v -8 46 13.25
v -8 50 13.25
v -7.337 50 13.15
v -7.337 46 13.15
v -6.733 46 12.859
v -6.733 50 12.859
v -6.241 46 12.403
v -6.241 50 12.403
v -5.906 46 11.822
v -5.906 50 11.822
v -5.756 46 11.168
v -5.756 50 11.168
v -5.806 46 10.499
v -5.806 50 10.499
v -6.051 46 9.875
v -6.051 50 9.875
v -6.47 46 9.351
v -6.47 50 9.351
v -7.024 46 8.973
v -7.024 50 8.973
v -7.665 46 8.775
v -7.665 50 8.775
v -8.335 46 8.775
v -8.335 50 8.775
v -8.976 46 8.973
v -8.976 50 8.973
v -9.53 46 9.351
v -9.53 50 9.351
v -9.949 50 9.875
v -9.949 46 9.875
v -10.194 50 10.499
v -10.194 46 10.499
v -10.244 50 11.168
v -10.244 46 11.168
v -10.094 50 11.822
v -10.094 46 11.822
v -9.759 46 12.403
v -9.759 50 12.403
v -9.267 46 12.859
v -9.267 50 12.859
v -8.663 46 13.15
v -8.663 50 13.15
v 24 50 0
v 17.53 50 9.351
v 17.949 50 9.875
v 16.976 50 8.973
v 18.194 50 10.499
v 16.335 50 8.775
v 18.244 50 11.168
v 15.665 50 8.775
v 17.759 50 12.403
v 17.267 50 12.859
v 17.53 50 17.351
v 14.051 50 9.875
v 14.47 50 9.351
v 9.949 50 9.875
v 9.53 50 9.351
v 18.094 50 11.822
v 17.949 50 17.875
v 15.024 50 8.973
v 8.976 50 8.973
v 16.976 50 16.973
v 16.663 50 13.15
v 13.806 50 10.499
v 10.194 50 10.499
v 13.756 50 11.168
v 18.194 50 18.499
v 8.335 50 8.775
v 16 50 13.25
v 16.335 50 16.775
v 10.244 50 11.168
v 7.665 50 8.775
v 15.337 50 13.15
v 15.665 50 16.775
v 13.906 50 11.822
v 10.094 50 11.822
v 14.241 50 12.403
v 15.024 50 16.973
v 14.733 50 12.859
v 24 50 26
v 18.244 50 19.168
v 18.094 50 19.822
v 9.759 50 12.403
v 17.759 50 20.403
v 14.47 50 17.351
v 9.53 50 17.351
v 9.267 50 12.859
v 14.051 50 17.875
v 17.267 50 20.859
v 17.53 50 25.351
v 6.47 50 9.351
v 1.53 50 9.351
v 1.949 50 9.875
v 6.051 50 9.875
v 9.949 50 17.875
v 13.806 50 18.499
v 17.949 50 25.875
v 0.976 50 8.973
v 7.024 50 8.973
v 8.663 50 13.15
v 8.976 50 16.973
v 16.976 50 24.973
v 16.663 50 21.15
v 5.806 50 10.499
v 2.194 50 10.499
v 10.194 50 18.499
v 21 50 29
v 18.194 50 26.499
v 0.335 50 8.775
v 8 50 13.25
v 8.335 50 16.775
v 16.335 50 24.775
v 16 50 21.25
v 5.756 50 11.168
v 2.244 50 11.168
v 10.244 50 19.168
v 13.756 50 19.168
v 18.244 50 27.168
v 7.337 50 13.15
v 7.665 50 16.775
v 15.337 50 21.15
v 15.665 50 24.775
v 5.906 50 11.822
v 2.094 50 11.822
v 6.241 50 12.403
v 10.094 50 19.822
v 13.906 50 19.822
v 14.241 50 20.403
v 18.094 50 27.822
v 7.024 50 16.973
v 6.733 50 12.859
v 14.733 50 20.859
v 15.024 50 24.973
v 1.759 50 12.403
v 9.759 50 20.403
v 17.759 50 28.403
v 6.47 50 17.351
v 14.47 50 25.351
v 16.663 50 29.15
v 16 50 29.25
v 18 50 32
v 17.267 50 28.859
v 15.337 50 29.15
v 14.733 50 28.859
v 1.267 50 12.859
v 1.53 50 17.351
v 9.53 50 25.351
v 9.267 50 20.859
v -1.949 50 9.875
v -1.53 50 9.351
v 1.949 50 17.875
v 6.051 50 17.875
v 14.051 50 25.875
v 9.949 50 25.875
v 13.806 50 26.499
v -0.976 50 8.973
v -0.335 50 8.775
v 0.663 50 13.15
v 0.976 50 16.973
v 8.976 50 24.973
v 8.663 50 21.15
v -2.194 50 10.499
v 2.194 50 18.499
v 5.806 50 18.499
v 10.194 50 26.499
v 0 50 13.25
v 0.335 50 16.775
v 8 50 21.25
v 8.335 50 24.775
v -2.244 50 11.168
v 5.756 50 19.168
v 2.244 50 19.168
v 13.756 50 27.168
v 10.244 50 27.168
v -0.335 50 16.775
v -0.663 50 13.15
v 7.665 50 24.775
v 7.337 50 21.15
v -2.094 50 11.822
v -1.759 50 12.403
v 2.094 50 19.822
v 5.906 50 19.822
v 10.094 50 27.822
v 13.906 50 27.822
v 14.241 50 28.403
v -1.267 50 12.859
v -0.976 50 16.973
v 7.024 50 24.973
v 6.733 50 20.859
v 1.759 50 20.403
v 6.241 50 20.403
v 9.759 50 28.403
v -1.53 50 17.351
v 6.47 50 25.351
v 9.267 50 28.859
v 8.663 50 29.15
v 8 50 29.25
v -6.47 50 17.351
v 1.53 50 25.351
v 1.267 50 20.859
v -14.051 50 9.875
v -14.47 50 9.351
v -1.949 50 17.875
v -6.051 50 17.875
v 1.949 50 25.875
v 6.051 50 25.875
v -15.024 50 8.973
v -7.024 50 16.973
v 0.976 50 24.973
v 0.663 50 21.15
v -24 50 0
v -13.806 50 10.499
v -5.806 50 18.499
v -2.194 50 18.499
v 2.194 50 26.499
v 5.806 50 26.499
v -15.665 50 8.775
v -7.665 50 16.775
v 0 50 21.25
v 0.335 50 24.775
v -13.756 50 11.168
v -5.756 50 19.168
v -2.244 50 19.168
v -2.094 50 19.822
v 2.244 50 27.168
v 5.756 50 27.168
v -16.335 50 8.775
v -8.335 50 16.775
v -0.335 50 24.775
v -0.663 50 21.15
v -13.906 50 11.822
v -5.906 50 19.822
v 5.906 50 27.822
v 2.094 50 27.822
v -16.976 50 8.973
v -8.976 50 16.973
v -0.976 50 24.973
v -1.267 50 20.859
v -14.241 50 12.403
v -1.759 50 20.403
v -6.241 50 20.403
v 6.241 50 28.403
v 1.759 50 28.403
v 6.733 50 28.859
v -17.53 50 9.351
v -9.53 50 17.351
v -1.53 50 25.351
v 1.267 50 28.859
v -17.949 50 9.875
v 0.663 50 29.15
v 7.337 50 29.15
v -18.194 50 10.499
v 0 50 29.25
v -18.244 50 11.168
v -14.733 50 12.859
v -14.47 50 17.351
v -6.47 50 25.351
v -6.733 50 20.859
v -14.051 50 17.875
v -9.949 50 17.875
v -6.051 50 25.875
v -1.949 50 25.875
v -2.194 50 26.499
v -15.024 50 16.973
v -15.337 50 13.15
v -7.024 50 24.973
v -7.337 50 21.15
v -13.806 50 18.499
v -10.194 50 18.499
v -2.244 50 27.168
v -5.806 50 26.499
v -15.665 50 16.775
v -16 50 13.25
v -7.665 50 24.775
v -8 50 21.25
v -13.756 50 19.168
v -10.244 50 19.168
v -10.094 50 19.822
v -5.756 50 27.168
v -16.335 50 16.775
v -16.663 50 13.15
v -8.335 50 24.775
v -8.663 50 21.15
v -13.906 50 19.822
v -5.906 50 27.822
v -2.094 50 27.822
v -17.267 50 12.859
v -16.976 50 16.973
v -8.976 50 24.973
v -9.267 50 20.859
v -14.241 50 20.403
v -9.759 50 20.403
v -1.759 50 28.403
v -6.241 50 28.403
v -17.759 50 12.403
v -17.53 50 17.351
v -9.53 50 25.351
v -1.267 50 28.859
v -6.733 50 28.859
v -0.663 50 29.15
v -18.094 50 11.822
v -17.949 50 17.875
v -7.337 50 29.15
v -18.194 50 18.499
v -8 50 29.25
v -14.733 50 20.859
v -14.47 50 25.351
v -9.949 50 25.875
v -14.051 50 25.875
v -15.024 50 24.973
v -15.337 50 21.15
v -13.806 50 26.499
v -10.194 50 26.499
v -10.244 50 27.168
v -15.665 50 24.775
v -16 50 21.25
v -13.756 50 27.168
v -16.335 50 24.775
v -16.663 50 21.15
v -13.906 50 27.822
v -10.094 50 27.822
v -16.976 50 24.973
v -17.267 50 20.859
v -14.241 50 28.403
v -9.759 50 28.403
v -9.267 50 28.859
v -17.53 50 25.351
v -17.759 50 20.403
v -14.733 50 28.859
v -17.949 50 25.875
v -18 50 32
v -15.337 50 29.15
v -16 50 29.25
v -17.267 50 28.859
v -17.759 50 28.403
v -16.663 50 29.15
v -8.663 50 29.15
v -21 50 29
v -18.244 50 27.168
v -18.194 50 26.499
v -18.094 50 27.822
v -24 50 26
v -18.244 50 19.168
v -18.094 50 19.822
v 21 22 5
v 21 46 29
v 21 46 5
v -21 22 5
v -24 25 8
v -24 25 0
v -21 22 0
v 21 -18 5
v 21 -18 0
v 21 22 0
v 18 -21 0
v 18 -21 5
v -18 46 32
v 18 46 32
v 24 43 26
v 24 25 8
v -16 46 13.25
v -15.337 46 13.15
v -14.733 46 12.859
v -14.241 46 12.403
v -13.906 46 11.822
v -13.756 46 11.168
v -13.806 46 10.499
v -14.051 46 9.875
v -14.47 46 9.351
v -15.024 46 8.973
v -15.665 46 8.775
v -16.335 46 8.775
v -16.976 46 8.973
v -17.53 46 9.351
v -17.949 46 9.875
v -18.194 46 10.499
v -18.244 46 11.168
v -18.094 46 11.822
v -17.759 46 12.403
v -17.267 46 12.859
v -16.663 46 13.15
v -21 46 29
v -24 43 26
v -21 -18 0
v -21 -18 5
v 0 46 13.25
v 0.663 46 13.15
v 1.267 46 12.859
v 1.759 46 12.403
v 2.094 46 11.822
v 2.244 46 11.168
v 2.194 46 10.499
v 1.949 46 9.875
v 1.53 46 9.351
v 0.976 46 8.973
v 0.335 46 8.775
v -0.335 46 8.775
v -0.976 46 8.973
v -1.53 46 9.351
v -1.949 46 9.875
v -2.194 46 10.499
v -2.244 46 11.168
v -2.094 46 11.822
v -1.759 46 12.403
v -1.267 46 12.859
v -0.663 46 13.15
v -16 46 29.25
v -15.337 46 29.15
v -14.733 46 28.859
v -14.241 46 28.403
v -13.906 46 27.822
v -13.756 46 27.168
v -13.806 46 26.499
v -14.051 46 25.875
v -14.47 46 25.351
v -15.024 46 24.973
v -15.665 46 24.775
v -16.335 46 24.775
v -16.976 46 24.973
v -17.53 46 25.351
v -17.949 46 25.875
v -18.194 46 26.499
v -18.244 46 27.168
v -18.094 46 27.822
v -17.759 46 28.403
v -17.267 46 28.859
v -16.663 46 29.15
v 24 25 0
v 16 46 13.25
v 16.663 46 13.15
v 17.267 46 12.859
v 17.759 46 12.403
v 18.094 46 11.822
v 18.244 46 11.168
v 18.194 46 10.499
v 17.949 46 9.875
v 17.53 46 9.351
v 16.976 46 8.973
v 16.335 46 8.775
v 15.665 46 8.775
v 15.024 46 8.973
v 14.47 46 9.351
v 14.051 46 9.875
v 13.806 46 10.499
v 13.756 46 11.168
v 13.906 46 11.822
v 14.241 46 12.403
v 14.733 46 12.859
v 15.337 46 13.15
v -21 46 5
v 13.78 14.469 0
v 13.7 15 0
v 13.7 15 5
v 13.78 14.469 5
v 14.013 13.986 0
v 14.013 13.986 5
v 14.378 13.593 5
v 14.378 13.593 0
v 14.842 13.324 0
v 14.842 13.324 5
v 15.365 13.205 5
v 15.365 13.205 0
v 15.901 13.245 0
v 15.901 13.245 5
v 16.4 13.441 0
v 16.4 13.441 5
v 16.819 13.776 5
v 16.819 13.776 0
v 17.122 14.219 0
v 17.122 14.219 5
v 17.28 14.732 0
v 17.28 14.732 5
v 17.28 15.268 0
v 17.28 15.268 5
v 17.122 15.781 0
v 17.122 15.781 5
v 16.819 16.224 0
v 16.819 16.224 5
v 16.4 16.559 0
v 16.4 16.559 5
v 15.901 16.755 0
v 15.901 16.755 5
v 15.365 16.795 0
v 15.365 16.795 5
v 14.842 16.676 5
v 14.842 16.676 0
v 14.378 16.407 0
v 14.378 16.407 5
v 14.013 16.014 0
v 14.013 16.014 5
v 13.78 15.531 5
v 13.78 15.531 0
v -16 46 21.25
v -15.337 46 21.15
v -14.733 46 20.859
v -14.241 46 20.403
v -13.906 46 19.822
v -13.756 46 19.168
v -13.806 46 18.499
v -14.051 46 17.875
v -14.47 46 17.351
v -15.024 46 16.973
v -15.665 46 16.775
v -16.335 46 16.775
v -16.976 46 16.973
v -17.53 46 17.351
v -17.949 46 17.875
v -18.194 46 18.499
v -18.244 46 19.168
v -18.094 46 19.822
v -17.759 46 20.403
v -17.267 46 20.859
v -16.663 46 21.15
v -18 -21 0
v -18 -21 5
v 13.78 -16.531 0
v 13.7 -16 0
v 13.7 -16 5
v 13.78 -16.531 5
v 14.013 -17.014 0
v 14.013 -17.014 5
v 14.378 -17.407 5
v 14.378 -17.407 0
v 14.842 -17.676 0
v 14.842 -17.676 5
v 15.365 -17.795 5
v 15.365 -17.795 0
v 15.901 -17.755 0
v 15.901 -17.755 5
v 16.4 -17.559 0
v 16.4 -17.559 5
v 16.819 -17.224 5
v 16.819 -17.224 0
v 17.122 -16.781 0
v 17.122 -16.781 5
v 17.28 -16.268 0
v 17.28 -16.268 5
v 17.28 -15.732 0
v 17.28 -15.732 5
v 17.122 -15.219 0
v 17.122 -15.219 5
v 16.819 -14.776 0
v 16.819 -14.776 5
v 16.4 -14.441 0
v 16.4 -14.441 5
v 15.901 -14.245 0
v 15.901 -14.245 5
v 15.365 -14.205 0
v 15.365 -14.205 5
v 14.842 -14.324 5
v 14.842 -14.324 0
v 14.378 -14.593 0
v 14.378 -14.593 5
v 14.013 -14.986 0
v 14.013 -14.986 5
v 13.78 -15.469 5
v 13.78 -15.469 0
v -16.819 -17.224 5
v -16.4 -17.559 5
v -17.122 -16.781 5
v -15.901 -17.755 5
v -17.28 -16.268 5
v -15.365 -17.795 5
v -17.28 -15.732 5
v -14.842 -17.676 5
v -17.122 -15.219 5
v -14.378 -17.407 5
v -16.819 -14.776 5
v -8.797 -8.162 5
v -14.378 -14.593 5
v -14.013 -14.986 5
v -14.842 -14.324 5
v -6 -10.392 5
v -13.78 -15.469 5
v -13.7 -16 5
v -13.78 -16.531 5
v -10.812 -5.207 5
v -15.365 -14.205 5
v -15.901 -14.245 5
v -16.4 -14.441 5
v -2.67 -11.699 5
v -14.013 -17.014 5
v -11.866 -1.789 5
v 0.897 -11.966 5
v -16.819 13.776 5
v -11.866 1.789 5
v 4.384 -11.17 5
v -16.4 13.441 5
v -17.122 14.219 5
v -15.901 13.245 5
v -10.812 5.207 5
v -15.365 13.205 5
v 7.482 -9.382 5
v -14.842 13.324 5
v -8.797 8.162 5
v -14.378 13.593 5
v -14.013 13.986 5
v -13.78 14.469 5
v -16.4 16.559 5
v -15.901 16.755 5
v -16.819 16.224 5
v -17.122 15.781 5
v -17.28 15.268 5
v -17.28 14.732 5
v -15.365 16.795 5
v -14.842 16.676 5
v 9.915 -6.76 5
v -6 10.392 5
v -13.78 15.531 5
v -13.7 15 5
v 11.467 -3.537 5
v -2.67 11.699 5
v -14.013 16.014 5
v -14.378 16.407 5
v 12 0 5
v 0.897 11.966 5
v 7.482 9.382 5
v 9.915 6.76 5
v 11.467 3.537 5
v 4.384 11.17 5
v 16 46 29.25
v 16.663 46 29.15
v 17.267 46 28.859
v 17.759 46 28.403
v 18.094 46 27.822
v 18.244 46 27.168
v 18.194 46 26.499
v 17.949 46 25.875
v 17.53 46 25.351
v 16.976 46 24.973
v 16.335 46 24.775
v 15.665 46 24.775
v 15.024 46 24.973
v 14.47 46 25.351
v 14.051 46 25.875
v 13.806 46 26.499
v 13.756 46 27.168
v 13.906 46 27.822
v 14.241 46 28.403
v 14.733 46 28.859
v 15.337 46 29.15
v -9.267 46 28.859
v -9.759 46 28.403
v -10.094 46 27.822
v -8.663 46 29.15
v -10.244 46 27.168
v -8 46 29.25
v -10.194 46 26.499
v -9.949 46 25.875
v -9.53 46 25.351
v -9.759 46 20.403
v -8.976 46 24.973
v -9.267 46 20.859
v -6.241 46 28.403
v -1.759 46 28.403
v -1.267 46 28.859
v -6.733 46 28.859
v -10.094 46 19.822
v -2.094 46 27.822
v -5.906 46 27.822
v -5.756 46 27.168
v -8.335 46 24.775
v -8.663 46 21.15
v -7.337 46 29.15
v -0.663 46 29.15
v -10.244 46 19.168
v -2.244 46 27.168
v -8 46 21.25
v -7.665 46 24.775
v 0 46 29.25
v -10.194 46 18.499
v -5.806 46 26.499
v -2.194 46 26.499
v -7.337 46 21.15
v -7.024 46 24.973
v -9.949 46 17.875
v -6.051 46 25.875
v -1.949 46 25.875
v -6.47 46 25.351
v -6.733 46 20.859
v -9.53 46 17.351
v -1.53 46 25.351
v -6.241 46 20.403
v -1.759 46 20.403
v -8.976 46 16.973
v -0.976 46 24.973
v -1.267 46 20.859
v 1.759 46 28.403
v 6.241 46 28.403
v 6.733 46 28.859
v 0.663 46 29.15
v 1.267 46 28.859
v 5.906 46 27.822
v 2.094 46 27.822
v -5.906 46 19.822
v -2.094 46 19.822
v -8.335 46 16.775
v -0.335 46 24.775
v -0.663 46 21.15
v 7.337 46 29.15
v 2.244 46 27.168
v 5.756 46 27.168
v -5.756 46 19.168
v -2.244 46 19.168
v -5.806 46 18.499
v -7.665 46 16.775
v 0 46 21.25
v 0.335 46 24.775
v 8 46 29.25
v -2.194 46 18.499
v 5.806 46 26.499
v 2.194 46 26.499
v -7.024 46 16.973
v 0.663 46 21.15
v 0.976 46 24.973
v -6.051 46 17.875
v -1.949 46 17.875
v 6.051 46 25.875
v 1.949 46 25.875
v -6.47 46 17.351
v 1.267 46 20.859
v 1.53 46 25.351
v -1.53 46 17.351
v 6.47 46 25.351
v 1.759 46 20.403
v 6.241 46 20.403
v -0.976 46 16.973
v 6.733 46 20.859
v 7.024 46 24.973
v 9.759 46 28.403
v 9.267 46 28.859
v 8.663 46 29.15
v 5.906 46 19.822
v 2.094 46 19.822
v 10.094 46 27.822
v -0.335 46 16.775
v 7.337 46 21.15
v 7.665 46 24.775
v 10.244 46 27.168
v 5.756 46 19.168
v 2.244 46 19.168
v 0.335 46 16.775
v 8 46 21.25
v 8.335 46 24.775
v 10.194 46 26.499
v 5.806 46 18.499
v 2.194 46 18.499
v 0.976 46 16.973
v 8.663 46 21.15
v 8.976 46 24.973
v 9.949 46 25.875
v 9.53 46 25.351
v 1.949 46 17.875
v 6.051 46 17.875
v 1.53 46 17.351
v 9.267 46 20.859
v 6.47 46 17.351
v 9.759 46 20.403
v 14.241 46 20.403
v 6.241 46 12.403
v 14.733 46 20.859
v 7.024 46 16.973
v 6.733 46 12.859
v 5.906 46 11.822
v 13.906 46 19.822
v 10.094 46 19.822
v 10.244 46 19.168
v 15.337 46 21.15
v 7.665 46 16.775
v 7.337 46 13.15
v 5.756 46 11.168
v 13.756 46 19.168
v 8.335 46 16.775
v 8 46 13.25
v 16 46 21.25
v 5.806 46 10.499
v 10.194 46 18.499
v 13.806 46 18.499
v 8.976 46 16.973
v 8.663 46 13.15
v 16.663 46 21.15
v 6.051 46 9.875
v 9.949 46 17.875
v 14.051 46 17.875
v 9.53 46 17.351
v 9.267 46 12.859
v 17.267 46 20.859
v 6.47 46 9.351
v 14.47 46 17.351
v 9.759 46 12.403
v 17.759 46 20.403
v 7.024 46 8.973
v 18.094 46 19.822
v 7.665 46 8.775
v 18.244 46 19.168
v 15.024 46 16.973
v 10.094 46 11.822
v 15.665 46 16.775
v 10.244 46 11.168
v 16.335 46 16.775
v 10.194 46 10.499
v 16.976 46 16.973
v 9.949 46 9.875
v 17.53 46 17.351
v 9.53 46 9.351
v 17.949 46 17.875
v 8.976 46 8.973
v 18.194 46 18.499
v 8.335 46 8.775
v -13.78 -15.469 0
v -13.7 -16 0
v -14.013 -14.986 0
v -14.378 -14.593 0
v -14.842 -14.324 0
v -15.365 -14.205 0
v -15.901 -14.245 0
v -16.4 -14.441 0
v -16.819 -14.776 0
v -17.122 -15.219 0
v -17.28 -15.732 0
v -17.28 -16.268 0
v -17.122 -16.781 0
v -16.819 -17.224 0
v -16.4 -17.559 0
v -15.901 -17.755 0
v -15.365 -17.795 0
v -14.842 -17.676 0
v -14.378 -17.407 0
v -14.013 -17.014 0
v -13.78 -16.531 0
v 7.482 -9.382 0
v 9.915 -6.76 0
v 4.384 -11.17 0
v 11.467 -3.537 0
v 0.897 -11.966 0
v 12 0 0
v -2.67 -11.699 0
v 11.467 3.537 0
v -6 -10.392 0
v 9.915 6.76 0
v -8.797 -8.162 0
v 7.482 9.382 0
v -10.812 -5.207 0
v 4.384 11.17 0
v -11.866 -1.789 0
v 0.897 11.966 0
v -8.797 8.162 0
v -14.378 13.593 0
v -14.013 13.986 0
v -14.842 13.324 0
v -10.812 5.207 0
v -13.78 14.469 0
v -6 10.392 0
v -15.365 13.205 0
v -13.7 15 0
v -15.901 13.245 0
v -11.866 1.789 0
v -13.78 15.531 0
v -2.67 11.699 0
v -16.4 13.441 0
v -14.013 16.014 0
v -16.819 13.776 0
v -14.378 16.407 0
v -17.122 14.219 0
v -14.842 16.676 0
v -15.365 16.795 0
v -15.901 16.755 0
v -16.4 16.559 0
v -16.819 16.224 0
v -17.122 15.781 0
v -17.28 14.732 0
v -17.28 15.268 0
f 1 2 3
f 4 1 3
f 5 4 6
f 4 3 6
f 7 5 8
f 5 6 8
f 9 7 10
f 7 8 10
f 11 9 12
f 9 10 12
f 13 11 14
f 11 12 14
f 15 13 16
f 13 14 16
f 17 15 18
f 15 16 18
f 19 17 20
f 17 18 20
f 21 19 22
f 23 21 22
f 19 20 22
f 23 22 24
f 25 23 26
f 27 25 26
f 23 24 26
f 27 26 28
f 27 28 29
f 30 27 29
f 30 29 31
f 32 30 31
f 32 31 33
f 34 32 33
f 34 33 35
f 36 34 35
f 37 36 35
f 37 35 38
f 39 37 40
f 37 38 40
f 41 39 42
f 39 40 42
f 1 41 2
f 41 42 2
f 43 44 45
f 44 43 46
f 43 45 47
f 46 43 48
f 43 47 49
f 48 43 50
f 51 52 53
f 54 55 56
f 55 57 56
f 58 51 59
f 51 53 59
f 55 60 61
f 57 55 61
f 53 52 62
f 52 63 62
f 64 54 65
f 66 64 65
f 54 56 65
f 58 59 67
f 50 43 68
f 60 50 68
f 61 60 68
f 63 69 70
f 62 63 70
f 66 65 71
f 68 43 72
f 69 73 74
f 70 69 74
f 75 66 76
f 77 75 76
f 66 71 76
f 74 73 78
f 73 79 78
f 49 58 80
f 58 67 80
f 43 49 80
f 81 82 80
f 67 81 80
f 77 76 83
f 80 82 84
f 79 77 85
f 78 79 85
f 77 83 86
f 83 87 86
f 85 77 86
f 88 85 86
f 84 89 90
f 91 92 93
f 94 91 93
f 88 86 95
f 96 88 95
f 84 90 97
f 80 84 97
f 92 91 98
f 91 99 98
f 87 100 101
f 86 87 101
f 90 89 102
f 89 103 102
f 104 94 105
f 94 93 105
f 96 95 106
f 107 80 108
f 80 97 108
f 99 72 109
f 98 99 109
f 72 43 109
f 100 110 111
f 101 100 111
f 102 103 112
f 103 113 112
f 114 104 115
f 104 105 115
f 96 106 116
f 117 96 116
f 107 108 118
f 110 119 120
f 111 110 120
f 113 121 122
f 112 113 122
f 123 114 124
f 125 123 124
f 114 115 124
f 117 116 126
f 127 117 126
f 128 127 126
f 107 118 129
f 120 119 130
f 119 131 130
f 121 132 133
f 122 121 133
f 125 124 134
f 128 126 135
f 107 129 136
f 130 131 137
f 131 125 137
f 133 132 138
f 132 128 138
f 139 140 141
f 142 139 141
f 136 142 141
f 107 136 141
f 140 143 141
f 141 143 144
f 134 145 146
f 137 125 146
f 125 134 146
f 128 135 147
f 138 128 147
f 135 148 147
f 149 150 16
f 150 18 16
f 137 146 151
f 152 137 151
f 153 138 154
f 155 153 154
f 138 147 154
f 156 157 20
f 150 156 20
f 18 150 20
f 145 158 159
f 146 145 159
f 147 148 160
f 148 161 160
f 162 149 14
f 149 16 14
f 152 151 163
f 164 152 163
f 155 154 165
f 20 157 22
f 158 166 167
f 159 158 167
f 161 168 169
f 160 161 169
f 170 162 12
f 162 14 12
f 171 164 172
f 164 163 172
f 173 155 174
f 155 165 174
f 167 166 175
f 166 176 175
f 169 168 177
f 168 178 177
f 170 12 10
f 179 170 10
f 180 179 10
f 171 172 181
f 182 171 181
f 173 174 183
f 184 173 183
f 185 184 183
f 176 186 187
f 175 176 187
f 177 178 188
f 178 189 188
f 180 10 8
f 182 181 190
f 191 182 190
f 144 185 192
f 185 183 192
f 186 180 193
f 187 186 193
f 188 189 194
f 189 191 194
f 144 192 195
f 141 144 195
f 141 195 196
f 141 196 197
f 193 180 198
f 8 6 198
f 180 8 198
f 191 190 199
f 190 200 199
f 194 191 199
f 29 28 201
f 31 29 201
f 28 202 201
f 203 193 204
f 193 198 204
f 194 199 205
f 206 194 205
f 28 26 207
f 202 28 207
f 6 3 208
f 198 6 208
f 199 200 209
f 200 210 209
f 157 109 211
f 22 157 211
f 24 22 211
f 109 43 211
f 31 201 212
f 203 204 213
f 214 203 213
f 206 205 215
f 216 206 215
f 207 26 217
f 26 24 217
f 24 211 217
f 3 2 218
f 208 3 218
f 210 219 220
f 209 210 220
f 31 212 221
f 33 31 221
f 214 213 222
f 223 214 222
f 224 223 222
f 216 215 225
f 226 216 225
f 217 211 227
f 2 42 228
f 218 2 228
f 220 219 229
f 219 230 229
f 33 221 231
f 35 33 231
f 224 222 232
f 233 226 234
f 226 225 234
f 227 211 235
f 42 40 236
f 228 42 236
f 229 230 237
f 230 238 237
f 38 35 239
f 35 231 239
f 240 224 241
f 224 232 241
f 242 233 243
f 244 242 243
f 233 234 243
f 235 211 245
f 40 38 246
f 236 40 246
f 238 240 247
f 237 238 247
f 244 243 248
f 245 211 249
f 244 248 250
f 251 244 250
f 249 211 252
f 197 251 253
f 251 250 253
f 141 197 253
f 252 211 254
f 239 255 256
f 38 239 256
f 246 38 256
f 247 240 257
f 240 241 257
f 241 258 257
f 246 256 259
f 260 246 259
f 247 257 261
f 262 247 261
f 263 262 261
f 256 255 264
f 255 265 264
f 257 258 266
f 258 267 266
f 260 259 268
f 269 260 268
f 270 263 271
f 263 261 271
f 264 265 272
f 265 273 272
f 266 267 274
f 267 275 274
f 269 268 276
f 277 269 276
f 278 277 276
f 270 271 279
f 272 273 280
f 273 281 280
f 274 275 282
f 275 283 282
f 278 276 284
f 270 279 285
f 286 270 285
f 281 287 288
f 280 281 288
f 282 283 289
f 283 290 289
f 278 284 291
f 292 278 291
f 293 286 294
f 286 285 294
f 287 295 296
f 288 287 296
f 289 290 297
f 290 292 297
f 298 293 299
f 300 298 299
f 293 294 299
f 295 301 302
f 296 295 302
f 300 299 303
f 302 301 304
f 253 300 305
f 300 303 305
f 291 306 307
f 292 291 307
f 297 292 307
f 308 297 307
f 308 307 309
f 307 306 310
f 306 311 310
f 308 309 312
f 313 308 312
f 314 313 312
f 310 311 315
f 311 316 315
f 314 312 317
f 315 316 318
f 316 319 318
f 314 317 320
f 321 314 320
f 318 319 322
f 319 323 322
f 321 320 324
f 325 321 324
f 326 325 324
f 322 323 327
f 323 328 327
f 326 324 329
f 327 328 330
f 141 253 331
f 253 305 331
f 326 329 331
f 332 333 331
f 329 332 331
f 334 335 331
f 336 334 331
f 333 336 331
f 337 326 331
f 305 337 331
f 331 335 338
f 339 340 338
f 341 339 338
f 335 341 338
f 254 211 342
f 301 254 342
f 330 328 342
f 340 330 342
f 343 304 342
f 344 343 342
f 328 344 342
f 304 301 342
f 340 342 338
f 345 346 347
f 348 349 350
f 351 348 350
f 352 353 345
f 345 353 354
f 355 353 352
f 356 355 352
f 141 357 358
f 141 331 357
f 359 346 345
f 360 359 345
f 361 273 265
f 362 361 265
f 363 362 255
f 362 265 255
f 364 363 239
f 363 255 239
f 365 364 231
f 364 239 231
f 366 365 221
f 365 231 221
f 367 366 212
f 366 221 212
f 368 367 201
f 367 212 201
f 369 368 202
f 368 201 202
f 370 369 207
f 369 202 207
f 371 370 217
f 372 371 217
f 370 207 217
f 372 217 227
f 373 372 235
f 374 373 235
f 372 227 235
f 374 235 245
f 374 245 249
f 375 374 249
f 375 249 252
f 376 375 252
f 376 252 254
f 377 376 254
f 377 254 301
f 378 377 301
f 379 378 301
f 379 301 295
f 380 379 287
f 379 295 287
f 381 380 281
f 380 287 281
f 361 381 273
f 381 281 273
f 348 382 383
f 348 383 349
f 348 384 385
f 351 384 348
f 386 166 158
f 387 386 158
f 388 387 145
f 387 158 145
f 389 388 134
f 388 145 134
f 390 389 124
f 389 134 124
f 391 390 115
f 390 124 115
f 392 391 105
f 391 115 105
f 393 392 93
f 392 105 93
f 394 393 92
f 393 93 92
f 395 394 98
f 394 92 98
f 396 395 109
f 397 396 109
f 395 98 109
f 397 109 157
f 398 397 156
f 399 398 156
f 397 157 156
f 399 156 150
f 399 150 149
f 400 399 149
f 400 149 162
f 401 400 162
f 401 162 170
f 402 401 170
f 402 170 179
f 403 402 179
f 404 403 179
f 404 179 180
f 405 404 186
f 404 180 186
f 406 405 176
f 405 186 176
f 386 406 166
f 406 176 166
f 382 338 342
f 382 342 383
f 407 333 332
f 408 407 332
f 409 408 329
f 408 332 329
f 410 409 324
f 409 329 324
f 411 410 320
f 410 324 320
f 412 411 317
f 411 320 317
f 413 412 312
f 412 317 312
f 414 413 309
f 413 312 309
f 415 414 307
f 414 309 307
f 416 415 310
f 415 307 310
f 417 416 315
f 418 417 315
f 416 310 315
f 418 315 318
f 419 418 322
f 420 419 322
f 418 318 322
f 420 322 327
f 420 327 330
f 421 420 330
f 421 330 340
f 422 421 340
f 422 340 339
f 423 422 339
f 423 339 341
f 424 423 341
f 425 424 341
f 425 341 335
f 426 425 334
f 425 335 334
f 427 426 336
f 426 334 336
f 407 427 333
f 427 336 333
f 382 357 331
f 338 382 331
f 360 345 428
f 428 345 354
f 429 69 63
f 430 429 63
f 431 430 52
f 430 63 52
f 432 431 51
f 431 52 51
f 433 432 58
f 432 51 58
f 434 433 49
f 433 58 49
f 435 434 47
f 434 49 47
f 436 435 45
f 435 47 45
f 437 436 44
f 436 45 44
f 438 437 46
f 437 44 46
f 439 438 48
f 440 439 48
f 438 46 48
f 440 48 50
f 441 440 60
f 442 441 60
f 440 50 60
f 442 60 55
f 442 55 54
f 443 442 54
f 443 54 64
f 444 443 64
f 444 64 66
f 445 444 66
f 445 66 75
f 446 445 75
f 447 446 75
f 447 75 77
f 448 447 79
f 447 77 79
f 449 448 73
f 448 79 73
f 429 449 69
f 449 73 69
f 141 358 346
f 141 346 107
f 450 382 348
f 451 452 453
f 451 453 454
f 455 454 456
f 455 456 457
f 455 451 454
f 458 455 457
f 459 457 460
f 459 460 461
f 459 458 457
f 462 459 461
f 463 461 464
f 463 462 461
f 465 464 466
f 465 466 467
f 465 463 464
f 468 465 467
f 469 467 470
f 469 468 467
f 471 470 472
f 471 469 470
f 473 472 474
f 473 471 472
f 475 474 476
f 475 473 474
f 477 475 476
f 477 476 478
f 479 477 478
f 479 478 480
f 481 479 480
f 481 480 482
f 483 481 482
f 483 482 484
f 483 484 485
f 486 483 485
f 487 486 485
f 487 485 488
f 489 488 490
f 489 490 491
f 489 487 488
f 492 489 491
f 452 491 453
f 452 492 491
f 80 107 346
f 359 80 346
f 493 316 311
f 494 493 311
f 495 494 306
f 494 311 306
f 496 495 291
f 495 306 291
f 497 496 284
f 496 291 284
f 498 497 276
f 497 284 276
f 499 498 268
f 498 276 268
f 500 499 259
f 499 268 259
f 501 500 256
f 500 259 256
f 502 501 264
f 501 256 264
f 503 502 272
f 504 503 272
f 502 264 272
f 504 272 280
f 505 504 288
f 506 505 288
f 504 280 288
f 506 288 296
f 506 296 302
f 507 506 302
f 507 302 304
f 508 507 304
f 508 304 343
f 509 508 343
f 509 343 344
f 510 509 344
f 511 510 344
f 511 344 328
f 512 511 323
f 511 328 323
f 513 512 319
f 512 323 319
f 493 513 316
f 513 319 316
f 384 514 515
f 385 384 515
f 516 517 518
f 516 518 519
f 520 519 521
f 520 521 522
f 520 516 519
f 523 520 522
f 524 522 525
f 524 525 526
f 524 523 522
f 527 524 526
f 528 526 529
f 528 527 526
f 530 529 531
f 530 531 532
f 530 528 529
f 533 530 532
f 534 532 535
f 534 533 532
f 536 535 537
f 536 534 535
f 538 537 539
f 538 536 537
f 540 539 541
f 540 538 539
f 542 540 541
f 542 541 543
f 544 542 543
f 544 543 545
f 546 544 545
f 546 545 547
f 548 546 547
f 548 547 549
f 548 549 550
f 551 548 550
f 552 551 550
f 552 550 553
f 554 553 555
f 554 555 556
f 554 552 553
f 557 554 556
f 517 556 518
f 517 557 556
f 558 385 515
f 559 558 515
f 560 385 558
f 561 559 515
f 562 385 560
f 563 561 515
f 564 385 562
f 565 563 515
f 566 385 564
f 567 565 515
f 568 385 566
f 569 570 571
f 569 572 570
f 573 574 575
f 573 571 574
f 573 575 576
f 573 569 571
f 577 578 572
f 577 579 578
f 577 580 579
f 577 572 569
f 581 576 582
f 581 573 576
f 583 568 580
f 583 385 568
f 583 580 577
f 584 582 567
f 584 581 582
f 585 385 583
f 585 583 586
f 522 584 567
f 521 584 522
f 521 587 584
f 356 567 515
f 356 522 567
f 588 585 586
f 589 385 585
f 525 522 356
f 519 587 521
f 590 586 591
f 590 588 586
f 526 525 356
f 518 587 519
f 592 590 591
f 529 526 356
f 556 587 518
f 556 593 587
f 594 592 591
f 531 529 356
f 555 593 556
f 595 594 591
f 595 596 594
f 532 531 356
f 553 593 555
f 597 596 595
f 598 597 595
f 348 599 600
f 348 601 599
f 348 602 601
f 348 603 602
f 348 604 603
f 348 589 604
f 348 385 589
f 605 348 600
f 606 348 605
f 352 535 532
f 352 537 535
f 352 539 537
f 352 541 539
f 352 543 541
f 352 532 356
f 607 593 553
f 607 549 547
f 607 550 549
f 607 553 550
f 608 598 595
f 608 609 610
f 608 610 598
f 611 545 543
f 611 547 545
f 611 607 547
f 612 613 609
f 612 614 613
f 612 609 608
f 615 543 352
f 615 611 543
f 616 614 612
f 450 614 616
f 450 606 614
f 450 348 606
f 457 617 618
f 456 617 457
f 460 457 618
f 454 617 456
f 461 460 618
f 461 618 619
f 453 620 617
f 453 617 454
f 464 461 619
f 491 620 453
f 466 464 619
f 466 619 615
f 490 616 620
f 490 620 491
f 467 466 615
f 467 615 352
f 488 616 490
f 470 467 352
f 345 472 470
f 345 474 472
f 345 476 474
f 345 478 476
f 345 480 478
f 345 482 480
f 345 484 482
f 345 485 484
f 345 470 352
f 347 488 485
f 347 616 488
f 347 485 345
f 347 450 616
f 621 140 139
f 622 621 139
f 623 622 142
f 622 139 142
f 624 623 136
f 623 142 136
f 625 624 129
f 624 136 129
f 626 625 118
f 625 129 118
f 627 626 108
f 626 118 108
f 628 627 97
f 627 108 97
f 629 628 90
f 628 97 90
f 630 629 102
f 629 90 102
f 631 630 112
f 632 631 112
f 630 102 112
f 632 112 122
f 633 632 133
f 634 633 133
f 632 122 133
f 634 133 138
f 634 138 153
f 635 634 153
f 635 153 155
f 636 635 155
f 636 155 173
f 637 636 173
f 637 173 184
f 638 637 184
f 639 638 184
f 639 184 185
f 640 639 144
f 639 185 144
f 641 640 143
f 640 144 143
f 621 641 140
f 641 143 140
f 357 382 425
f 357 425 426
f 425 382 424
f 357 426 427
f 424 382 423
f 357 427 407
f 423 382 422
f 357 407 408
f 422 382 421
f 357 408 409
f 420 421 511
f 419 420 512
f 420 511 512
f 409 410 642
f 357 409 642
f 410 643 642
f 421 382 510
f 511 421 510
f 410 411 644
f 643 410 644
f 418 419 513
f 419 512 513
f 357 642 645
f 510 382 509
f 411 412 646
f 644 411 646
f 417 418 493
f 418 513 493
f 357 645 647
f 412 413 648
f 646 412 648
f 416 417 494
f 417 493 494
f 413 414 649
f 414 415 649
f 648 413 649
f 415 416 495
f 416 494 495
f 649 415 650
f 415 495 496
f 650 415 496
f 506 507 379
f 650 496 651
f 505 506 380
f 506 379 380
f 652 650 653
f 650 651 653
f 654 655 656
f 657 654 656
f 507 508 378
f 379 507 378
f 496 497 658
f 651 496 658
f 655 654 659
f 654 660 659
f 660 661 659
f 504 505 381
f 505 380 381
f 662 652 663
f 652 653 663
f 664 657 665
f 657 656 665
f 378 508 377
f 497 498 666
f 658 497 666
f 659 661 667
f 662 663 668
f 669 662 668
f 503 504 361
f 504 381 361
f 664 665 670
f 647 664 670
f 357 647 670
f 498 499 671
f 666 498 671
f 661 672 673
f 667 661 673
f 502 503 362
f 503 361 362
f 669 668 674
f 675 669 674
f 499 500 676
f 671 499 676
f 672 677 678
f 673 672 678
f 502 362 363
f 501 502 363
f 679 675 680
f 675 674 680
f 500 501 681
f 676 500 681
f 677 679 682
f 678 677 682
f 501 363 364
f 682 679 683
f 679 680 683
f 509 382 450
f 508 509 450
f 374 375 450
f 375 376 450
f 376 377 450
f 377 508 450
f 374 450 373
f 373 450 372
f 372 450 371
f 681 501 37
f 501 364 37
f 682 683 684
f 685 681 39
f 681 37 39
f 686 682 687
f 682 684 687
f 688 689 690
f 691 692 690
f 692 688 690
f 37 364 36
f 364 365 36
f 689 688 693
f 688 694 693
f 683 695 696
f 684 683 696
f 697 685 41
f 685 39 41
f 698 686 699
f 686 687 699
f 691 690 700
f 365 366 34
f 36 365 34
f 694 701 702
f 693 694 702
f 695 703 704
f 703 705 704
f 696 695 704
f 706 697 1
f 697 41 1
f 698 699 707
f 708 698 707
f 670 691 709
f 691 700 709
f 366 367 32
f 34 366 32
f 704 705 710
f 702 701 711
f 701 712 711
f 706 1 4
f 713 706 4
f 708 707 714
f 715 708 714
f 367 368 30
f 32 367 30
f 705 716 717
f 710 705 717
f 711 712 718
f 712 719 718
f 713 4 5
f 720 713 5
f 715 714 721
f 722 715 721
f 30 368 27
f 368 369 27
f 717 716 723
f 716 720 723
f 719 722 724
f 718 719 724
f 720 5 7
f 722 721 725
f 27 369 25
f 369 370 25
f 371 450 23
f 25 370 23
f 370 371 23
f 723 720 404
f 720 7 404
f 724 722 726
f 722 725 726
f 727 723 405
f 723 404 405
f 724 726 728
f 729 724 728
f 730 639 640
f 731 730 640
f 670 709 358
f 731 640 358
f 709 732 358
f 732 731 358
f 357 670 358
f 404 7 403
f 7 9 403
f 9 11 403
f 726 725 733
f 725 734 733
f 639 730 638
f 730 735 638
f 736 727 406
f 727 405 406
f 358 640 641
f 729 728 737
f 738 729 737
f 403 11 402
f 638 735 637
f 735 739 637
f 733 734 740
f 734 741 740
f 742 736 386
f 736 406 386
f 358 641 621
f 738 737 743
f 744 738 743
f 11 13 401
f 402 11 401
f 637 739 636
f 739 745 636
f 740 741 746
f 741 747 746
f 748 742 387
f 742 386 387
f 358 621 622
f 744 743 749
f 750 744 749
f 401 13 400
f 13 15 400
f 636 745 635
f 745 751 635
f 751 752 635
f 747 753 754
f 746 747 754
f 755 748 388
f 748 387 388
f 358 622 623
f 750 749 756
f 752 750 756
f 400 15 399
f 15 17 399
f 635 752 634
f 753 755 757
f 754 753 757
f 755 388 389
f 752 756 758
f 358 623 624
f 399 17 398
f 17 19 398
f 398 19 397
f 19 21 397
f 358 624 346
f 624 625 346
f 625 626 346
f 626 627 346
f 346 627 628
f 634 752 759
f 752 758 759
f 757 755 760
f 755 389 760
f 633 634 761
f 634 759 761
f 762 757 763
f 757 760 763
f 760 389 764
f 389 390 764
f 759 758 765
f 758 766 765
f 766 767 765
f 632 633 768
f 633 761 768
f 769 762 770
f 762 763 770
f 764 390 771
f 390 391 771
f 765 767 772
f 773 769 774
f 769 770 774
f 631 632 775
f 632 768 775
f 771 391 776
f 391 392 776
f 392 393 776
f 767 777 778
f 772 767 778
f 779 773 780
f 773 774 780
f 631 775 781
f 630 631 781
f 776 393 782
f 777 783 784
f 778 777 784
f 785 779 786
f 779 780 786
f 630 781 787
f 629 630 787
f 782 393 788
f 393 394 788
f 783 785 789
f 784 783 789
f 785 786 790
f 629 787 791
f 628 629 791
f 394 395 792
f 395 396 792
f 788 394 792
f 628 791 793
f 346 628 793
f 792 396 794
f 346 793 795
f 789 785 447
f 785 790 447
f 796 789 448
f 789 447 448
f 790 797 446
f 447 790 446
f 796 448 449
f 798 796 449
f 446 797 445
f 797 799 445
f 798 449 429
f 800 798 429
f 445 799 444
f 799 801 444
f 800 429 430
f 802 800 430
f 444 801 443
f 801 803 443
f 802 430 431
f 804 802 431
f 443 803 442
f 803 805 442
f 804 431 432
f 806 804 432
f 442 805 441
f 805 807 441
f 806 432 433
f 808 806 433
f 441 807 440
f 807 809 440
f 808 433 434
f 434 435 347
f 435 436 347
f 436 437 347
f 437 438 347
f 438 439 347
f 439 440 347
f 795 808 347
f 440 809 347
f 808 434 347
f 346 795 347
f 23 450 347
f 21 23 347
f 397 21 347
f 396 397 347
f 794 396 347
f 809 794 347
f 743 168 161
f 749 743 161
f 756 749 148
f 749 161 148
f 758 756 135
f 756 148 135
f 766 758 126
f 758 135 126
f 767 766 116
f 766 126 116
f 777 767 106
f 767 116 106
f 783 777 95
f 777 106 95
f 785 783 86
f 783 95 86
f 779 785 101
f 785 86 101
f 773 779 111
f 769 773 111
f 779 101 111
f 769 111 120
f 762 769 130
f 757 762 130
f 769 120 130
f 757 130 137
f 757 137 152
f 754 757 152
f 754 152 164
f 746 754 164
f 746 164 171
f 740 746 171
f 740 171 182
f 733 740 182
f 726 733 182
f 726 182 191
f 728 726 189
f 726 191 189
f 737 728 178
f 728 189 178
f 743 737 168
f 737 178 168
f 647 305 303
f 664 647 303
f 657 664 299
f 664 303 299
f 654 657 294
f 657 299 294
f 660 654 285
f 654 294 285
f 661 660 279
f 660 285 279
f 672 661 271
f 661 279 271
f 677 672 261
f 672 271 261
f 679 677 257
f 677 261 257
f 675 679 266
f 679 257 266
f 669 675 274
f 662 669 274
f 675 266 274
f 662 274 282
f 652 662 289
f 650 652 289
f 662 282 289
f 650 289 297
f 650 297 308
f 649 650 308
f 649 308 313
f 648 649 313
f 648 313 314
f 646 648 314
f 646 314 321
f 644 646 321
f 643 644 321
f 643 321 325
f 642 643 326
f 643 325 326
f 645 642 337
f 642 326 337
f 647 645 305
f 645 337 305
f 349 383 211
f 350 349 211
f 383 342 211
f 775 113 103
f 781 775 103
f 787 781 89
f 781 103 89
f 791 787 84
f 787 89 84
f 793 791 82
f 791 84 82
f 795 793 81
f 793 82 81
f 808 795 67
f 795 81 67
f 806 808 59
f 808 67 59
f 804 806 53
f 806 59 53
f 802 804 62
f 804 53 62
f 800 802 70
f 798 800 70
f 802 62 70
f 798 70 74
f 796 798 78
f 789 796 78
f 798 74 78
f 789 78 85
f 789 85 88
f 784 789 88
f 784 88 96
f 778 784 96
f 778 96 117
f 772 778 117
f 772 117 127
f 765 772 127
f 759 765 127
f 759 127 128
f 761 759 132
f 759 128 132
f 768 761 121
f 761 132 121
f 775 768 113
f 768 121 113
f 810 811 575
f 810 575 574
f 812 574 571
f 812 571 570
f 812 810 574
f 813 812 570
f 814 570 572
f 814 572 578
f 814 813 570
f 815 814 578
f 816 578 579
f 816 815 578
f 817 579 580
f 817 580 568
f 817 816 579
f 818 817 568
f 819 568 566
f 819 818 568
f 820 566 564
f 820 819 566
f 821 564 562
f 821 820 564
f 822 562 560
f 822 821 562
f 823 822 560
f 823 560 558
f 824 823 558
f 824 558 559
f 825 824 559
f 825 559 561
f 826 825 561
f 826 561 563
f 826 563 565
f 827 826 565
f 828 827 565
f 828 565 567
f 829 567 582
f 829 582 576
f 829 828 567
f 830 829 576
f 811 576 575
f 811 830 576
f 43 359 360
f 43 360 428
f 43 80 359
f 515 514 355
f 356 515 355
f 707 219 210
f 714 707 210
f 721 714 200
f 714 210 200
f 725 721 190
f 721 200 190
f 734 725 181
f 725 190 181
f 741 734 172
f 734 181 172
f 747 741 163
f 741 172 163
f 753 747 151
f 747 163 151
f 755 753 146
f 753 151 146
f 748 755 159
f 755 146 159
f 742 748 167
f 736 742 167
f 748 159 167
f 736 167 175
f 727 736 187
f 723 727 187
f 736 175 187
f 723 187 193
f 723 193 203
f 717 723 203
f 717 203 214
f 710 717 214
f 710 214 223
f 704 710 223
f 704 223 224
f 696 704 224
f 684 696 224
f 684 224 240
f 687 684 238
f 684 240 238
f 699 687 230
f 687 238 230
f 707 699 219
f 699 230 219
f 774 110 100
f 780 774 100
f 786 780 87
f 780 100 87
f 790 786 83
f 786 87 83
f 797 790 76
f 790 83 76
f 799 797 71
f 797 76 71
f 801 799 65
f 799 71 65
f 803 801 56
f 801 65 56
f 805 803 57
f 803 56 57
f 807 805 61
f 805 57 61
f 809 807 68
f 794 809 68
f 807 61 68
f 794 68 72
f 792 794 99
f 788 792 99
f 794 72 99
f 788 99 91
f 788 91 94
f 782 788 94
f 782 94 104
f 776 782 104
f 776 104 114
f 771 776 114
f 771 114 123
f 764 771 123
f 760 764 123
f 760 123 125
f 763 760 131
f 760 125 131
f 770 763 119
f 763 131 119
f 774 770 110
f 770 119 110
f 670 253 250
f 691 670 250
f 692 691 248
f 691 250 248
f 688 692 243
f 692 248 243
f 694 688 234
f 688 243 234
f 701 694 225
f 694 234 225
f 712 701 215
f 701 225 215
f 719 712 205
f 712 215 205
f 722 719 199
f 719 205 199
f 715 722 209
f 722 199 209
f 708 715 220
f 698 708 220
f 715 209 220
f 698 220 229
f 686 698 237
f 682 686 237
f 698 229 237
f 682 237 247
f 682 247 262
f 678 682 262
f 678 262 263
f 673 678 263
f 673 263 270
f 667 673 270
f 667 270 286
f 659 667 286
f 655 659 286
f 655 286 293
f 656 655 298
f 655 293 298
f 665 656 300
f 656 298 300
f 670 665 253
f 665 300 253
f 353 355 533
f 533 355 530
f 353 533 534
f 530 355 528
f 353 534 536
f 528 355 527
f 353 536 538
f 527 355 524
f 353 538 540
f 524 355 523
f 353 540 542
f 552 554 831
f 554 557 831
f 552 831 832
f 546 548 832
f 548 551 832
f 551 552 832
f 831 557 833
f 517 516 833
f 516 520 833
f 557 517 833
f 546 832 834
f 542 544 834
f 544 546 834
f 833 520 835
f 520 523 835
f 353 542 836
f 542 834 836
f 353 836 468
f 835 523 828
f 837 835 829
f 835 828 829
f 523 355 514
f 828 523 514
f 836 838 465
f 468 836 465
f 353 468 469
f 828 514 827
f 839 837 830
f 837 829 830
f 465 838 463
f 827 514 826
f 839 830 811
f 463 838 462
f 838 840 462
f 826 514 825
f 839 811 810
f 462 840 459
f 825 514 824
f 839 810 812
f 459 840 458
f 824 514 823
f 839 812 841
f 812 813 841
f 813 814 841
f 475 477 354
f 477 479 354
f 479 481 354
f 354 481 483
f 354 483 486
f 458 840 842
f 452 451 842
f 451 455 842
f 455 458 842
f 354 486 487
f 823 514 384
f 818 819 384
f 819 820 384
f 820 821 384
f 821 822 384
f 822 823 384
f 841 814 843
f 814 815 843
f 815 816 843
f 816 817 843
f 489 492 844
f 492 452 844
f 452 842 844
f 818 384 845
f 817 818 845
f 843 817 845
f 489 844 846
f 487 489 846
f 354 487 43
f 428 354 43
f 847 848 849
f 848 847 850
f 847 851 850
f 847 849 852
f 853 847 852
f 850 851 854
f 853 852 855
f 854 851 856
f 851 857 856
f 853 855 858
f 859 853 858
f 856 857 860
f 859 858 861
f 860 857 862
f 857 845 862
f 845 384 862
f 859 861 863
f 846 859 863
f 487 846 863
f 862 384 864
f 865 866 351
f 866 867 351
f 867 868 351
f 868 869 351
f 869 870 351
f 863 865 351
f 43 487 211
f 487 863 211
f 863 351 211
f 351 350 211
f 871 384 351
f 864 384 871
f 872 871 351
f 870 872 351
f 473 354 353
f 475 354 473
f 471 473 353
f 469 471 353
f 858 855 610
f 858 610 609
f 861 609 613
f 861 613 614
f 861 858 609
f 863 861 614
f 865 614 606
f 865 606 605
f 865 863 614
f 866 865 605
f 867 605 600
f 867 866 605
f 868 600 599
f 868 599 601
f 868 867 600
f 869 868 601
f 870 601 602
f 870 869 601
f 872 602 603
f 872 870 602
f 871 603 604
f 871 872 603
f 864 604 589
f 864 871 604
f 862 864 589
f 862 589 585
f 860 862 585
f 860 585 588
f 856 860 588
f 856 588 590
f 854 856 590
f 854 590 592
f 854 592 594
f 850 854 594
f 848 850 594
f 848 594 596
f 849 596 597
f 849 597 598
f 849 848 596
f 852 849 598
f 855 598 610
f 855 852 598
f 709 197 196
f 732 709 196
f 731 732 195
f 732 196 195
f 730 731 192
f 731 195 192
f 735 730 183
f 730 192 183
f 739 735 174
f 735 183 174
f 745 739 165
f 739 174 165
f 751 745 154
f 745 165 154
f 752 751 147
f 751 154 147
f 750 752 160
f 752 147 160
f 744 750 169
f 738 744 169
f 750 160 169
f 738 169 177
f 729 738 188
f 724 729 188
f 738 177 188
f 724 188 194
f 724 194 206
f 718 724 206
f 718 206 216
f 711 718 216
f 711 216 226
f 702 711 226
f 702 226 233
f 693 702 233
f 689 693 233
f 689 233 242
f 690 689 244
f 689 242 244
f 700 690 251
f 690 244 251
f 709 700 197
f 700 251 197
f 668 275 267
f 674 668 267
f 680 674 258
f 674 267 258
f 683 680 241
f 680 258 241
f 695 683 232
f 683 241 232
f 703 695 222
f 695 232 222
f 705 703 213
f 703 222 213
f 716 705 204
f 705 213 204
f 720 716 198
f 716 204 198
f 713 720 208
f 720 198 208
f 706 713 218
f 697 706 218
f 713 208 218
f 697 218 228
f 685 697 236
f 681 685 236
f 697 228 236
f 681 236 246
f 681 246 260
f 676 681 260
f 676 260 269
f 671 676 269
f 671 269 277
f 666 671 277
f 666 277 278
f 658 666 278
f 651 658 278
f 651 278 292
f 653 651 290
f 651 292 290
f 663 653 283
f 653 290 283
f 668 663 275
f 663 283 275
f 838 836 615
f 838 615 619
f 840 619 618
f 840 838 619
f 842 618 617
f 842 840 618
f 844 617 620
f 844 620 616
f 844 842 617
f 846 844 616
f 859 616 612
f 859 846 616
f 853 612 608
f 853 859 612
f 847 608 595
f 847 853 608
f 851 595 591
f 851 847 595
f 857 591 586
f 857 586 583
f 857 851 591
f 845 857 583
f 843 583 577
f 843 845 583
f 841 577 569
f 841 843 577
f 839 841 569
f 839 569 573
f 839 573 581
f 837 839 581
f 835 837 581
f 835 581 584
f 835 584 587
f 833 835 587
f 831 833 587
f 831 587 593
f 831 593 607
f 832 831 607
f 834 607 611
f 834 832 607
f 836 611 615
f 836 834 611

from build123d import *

# Parameters (mm, degrees)
SKETCH_1_R          = 1.8
SKETCH_1_R_2        = 12
EXTRUDE_1_DEPTH     = 5
SKETCH_4_W          = 42
SKETCH_4_H          = 4
EXTRUDE_2_DEPTH     = 27
SKETCH_5_R          = 2.25
CUT_EXTRUDE_1_DEPTH = 4
CHAMFER_1_SIZE      = 3
EXTRUDE_3_DEPTH     = 3
CHAMFER_2_SIZE      = 3


with BuildPart() as part:
    # 草图1 → 凸台-拉伸1 (new body)
    with BuildSketch(Plane.XY):
        Polygon((-21, 21), (-21, -21), (21, -21), (21, 21), (21, 50), (-21, 50), align=None)
        with Locations((-15.5, -16)):
            Circle(SKETCH_1_R, mode=Mode.SUBTRACT)
        with Locations((-15.5, 15)):
            Circle(SKETCH_1_R, mode=Mode.SUBTRACT)
        with Locations(Location((15.5, -16, 0), (0, 0, 180))):
            Circle(SKETCH_1_R, mode=Mode.SUBTRACT)
        with Locations(Location((15.5, 15, 0), (0, 0, 180))):
            Circle(SKETCH_1_R, mode=Mode.SUBTRACT)
        Circle(SKETCH_1_R_2, mode=Mode.SUBTRACT)
    extrude(amount=EXTRUDE_1_DEPTH)

    # 草图4 → 凸台-拉伸2 (add)
    with BuildSketch(Plane.XY.offset(5)):
        with Locations((0, 48)):
            Rectangle(SKETCH_4_W, SKETCH_4_H)
    extrude(amount=EXTRUDE_2_DEPTH)

    # 草图5 → 切除-拉伸1 (cut)
    with BuildSketch(Plane(origin=(0, 50, 0), x_dir=(1, 0, 0), z_dir=(0, 1, 0))):
        with Locations(Location((-16, -27, 0), (0, 0, 270))):
            Circle(SKETCH_5_R)
        with Locations(Location((-8, -27, 0), (0, 0, 270))):
            Circle(SKETCH_5_R)
        with Locations(Location((0, -27, 0), (0, 0, 270))):
            Circle(SKETCH_5_R)
        with Locations(Location((8, -27, 0), (0, 0, 270))):
            Circle(SKETCH_5_R)
        with Locations(Location((16, -27, 0), (0, 0, 270))):
            Circle(SKETCH_5_R)
        with Locations(Location((-16, -19, 0), (0, 0, 270))):
            Circle(SKETCH_5_R)
        with Locations(Location((-8, -19, 0), (0, 0, 270))):
            Circle(SKETCH_5_R)
        with Locations(Location((0, -19, 0), (0, 0, 270))):
            Circle(SKETCH_5_R)
        with Locations(Location((8, -19, 0), (0, 0, 270))):
            Circle(SKETCH_5_R)
        with Locations(Location((16, -19, 0), (0, 0, 270))):
            Circle(SKETCH_5_R)
        with Locations(Location((-16, -11, 0), (0, 0, 270))):
            Circle(SKETCH_5_R)
        with Locations(Location((-8, -11, 0), (0, 0, 270))):
            Circle(SKETCH_5_R)
        with Locations(Location((0, -11, 0), (0, 0, 270))):
            Circle(SKETCH_5_R)
        with Locations(Location((8, -11, 0), (0, 0, 270))):
            Circle(SKETCH_5_R)
        with Locations(Location((16, -11, 0), (0, 0, 270))):
            Circle(SKETCH_5_R)
    extrude(amount=-CUT_EXTRUDE_1_DEPTH, mode=Mode.SUBTRACT)

    # 倒角1
    chamfer_1_edges = [part.edges().sort_by_distance(p)[0] for p in [
        (21, -21, 2.5),
        (-21, -21, 2.5),
        (21, 48, 32),
        (-21, 48, 32),
    ]]
    chamfer(chamfer_1_edges, length=CHAMFER_1_SIZE)

    # 草图7 → 凸台-拉伸3 (add)
    with BuildSketch(Plane.ZY.offset(21)):
        Polygon((29, 46), (5, 22), (0, 22), (0, 50), (29, 50), align=None)
    extrude_3 = extrude(amount=EXTRUDE_3_DEPTH)

    # 镜向1: 凸台-拉伸3 across plane
    add(extrude_3.mirror(Plane(origin=(0, 0, 0), x_dir=(0, 0, 1), z_dir=(1, 0, 0))))

    # 倒角2
    chamfer_2_edges = [part.edges().sort_by_distance(p)[0] for p in [
        (24, 22, 2.5),
        (24, 48, 29),
        (-24, 48, 29),
        (-24, 22, 2.5),
    ]]
    chamfer(chamfer_2_edges, length=CHAMFER_2_SIZE - 0.0001)  # a hair under: the kernel refuses the full size


solid = part.part
